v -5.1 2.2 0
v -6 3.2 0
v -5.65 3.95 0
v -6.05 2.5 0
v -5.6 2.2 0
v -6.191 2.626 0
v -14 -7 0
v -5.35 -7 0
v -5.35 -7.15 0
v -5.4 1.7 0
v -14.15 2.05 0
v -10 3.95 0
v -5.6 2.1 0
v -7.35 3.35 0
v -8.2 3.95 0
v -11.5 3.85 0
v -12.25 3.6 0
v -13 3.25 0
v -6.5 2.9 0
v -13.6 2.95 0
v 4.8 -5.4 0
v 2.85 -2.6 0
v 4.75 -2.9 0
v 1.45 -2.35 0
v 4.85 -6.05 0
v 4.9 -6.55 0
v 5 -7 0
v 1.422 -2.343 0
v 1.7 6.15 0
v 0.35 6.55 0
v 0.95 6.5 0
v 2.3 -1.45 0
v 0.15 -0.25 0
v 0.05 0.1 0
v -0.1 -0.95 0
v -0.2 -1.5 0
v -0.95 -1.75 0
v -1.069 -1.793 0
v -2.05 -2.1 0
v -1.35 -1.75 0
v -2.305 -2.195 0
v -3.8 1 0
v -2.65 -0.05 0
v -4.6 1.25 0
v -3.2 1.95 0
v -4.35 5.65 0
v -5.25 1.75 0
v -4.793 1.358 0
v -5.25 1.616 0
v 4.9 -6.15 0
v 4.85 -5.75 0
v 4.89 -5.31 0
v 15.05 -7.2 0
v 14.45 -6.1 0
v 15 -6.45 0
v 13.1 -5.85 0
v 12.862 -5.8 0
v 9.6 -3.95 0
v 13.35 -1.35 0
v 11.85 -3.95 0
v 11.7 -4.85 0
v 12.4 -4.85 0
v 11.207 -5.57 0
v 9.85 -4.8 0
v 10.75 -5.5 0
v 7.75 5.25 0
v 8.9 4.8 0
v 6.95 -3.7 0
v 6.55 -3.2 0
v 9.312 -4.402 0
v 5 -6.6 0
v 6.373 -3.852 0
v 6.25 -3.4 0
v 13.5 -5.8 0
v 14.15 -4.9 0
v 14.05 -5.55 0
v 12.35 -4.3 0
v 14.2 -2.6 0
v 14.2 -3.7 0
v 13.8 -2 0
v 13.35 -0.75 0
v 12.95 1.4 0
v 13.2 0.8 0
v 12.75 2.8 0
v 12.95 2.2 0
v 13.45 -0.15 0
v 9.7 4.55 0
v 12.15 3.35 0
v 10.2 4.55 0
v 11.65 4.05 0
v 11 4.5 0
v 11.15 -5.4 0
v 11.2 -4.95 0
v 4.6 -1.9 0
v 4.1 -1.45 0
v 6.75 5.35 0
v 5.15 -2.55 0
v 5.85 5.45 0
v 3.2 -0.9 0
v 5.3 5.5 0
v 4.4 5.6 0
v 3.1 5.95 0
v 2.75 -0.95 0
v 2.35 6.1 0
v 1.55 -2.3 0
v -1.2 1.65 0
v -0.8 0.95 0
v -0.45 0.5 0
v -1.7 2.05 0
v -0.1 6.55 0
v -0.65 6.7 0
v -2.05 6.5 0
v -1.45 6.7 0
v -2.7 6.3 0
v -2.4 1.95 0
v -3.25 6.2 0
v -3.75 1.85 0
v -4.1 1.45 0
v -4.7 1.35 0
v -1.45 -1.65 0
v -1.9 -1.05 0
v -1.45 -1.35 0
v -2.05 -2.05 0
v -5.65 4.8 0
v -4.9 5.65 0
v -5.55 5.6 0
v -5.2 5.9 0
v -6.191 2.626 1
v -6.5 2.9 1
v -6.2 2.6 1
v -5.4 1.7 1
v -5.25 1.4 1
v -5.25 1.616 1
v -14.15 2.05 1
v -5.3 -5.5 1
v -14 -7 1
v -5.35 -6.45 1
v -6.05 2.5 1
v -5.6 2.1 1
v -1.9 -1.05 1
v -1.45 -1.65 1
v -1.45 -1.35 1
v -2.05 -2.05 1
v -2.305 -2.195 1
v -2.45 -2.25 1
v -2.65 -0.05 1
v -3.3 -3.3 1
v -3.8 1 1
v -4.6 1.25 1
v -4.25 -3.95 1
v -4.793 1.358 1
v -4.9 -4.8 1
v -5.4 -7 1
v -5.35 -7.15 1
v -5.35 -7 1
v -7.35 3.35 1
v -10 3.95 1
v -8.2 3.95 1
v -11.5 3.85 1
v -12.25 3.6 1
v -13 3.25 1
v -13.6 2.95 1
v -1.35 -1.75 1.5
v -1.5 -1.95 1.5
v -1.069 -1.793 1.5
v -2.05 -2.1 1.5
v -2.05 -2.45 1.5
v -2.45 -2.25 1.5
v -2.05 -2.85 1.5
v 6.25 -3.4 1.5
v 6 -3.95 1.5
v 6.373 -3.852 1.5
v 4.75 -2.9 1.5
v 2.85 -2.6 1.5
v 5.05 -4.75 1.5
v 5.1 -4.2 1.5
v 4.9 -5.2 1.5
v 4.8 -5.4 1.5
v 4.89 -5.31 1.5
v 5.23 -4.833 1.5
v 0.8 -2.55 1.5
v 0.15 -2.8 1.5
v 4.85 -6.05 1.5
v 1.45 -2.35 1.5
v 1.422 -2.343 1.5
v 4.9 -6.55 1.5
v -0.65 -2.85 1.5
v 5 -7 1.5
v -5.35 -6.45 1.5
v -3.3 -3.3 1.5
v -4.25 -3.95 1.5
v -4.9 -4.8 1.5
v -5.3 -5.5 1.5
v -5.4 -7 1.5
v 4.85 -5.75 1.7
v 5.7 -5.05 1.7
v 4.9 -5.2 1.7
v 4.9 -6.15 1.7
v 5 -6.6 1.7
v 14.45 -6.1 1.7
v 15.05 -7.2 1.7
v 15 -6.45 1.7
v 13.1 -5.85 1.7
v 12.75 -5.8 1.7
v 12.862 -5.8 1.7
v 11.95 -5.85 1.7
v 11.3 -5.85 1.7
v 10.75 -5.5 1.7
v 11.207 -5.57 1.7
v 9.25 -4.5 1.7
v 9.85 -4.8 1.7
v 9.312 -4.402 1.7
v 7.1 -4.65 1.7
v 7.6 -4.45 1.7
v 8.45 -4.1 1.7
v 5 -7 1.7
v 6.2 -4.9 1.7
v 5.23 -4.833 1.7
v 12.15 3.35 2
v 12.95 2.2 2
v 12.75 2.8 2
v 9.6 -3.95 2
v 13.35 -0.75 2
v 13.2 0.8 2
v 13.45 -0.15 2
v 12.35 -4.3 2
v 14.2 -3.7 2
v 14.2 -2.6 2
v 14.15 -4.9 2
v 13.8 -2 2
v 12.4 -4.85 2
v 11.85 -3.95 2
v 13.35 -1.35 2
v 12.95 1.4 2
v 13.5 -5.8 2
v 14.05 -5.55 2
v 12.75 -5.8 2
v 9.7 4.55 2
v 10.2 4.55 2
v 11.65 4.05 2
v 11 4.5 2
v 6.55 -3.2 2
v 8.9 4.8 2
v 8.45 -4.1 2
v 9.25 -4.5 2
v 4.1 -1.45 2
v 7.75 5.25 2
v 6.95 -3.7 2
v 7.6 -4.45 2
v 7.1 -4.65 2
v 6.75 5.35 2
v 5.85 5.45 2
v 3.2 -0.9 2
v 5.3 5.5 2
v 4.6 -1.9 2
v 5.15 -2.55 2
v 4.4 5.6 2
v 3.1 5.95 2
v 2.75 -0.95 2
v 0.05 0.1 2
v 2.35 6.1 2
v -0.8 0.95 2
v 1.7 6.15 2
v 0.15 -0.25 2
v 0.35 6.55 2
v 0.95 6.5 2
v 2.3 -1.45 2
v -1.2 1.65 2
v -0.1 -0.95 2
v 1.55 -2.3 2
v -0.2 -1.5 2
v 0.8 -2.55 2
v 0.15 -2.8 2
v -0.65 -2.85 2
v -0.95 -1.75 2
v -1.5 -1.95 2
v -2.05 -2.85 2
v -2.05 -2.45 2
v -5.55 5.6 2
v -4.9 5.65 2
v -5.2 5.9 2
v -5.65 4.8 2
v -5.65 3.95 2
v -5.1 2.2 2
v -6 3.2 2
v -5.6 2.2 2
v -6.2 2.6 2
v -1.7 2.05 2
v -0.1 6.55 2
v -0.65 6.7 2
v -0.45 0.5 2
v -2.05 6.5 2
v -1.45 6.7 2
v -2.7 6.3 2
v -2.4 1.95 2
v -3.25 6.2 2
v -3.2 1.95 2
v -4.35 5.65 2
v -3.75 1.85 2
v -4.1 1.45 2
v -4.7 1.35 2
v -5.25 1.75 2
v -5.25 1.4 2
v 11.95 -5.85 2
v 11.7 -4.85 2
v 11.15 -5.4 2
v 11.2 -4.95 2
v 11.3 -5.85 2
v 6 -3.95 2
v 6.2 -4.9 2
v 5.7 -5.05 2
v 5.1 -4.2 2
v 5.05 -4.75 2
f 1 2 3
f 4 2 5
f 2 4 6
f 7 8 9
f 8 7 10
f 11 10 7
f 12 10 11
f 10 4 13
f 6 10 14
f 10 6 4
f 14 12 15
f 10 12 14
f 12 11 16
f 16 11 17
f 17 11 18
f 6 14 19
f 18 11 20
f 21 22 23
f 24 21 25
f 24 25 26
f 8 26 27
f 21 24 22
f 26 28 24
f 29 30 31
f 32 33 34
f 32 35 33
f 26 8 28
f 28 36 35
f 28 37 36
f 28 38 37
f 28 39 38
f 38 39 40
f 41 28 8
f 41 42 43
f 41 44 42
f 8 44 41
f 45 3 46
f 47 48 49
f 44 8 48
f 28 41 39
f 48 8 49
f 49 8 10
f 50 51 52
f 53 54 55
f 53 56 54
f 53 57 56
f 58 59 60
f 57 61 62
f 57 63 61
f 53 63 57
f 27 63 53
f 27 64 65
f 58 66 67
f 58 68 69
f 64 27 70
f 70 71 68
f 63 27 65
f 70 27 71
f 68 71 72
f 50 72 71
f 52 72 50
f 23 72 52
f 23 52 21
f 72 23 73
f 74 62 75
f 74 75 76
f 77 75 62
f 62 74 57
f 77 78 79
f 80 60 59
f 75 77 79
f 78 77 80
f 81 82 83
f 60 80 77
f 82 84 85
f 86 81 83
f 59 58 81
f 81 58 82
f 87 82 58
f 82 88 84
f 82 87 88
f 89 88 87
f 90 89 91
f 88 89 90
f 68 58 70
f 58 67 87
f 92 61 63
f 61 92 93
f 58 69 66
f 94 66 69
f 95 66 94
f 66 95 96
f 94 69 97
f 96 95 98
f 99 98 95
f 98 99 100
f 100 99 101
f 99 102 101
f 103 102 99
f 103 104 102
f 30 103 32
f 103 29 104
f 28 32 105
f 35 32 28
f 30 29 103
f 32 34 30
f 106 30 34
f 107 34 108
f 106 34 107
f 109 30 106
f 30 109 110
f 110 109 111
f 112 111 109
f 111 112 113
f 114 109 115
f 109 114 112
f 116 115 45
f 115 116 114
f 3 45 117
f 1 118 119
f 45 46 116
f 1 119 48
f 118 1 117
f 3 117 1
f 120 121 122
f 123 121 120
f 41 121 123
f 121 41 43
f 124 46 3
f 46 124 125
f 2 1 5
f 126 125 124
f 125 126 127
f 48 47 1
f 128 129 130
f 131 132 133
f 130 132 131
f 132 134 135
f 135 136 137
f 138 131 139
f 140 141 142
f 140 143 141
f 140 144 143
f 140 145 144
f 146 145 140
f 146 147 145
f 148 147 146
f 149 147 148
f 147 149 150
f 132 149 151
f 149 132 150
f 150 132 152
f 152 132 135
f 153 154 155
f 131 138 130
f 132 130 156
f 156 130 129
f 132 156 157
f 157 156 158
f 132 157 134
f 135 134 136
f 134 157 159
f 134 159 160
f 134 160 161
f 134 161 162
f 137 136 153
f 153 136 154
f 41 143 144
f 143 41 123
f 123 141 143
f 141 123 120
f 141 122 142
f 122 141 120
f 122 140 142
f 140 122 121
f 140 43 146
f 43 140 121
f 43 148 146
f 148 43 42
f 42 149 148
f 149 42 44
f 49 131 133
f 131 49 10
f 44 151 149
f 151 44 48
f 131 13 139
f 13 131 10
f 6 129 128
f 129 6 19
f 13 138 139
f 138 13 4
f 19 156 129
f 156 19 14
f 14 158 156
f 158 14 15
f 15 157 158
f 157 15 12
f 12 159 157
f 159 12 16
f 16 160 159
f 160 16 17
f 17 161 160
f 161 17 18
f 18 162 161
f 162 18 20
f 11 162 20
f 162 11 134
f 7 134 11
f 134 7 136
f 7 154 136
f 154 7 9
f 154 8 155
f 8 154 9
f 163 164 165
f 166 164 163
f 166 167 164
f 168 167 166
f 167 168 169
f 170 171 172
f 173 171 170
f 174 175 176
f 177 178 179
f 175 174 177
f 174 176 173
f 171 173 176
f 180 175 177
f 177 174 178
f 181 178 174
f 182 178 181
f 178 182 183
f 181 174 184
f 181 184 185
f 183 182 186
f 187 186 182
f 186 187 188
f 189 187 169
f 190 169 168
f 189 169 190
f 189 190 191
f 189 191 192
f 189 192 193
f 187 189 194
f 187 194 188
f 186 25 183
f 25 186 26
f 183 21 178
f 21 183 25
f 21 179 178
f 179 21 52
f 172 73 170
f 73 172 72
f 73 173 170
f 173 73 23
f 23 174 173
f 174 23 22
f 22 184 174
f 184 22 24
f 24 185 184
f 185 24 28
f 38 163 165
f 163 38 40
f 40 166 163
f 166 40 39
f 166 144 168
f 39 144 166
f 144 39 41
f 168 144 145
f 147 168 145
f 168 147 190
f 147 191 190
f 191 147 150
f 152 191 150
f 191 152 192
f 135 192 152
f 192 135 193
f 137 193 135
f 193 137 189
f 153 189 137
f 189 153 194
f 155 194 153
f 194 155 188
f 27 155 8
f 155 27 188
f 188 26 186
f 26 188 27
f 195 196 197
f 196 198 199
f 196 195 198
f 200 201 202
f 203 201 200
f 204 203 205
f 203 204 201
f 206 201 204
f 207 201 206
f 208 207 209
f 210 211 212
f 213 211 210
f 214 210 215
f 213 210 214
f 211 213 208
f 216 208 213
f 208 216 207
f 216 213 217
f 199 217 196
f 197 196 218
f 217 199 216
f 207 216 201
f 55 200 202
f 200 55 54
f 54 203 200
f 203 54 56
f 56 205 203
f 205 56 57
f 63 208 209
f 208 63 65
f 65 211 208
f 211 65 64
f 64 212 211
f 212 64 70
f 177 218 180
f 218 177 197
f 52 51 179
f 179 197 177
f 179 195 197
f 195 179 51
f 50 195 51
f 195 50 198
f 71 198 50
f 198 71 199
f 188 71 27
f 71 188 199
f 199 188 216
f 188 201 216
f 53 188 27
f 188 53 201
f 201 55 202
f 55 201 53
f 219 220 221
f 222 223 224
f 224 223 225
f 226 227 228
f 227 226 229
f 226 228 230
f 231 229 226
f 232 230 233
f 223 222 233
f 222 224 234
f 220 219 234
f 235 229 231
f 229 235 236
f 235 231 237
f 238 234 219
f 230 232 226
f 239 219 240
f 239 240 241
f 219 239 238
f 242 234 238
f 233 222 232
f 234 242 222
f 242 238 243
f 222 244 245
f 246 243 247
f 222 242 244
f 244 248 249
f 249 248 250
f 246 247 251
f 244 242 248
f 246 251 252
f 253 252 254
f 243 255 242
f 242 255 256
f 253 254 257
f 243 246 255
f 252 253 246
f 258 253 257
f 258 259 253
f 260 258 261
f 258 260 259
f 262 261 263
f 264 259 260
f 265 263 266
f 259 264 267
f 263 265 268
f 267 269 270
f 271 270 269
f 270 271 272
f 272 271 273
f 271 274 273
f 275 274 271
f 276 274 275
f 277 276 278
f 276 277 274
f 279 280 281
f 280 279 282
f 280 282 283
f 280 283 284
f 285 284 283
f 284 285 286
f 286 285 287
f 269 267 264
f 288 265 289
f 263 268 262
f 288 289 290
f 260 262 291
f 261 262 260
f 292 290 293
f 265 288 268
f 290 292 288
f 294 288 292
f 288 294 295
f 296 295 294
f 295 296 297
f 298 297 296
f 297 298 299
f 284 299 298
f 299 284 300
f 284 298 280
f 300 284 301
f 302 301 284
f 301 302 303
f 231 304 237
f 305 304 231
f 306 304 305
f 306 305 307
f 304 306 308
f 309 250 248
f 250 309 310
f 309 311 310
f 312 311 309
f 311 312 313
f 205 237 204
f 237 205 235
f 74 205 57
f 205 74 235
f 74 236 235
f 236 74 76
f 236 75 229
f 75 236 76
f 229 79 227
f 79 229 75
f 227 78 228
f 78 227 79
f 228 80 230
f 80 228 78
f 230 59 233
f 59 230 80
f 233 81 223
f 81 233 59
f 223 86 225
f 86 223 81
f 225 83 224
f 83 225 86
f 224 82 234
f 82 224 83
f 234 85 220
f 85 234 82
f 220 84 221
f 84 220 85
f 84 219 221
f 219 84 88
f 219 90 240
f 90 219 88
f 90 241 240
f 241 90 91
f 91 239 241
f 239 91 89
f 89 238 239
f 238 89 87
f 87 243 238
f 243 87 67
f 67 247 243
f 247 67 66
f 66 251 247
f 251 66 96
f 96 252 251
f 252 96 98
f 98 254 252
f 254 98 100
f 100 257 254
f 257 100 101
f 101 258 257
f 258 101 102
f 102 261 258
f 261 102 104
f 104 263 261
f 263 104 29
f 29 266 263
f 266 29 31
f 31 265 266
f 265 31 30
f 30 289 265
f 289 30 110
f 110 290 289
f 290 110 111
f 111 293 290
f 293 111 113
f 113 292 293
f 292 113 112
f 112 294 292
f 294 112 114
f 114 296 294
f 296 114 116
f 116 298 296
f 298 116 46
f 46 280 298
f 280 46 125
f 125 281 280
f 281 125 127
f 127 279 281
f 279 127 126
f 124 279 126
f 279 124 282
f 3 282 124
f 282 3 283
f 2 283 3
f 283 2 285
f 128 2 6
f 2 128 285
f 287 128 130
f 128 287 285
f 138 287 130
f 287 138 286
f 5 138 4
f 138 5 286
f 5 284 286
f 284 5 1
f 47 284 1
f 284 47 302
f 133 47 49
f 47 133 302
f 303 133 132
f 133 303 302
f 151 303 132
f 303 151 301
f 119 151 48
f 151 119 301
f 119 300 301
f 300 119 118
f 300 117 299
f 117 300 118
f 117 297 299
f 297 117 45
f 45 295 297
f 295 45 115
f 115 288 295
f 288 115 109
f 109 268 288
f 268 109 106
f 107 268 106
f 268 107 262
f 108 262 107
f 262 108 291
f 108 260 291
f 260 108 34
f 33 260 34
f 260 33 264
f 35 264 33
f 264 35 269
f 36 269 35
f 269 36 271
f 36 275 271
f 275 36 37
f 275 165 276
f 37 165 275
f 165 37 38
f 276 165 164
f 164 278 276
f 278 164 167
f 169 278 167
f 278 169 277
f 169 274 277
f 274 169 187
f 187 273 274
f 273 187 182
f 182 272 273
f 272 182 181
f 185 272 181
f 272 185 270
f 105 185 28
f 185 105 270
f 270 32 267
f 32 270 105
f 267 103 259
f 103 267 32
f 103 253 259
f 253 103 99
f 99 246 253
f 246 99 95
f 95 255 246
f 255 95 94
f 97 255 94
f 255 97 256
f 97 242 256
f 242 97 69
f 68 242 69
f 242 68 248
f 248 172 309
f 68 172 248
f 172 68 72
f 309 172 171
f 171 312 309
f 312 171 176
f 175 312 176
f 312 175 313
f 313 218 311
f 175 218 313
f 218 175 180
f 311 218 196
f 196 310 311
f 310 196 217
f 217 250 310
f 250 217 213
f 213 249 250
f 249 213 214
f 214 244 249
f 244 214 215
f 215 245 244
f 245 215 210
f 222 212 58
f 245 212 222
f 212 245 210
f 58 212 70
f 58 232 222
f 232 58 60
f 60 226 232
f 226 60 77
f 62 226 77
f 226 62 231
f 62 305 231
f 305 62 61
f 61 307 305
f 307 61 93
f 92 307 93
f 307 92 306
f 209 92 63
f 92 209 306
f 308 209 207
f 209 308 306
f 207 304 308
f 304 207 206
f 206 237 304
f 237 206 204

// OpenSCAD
//start
module  module1() 
{ 
color  ([0.4,0.6,0.4]) 
{ 
            polygon(points = [
[-14.15,2.05]
,[-13.60,2.95]
,[-13.00,3.25]
,[-12.25,3.60]
,[-11.50,3.85]
,[-10.75,3.90]
,[-10.00,3.95]
,[-9.10,3.95]
,[-8.20,3.95]
,[-7.35,3.35]
,[-6.50,2.90]
,[-6.05,2.50]
,[-5.60,2.10]
,[-5.40,1.70]
,[-4.60,1.25]
,[-3.80,1.00]
,[-2.65,-0.05]
,[-1.90,-1.05]
,[-1.45,-1.35]
,[-1.45,-1.65]
,[-2.05,-2.05]
,[-2.40,-2.25]
,[-3.30,-3.40]
,[-4.25,-4.05]
,[-4.85,-4.85]
,[-5.20,-5.50]
,[-5.35,-6.45]
,[-5.35,-7.15]
,[-14.00,-7.00]
]
,paths = [
[0,1,2,3,4,5,6,7,8,9,10,11,12,13,14,15,16,17,18,19,20,21,22,23,24,25,26,27,28]]
            );
}
}
//start
module  module2() 
{ 
color  ([0.6,1,0.8]) 
{ 
            polygon(points = [
[-1.35,-1.75]
,[-2.05,-2.10]
,[-2.45,-2.25]
,[-3.30,-3.30]
,[-4.25,-3.95]
,[-4.90,-4.80]
,[-5.30,-5.50]
,[-5.35,-6.45]
,[-5.40,-7.00]
,[5.00,-7.00]
,[4.90,-6.55]
,[4.85,-6.05]
,[4.80,-5.40]
,[5.25,-4.95]
,[5.85,-4.40]
,[6.40,-3.95]
,[6.25,-3.40]
,[4.75,-2.90]
,[2.85,-2.60]
,[1.45,-2.35]
,[-0.05,-1.95]
]
,paths = [
[0,1,2,3,4,5,6,7,8,9,10,11,12,13,14,15,16,17,18,19,20]]
            );
}
}
//start
module  module3() 
{ 
color  ([0.6,0.6,0.2]) 
{ 
            polygon(points = [
[6.70,-3.85]
,[7.35,-3.85]
,[8.15,-3.95]
,[8.70,-3.95]
,[9.85,-4.80]
,[10.75,-5.50]
,[11.40,-5.60]
,[12.15,-5.65]
,[13.10,-5.85]
,[14.45,-6.10]
,[15.00,-6.45]
,[15.05,-7.20]
,[5.00,-7.00]
,[5.00,-6.60]
,[4.90,-6.15]
,[4.85,-5.75]
,[4.90,-5.20]
,[5.35,-4.70]
,[6.00,-4.20]
,[6.75,-3.95]
]
,paths = [
[0,1,2,3,4,5,6,7,8,9,10,11,12,13,14,15,16,17,18],[19]]
            );
}
}
//start
module  module4() 
{ 
color  ([1,0.8549019607843137,0.5411764705882353]) 
{ 
            polygon(points = [
[6.20,-4.90]
,[5.70,-5.05]
,[5.05,-4.75]
,[5.10,-4.20]
,[6.00,-3.95]
,[6.95,-3.70]
,[6.55,-3.20]
,[5.15,-2.55]
,[4.60,-1.90]
,[4.10,-1.45]
,[3.20,-0.90]
,[2.75,-0.95]
,[2.30,-1.45]
,[1.55,-2.30]
,[0.80,-2.55]
,[0.15,-2.80]
,[-0.65,-2.85]
,[-1.65,-2.85]
,[-2.05,-2.85]
,[-2.05,-2.45]
,[-1.50,-1.95]
,[-0.95,-1.75]
,[-0.20,-1.50]
,[-0.10,-0.95]
,[0.15,-0.25]
,[0.05,0.10]
,[-0.45,0.50]
,[-0.80,0.95]
,[-1.20,1.65]
,[-1.70,2.05]
,[-2.40,1.95]
,[-3.20,1.95]
,[-3.75,1.85]
,[-4.10,1.45]
,[-4.70,1.35]
,[-5.25,1.40]
,[-5.25,1.75]
,[-5.10,2.20]
,[-5.60,2.20]
,[-6.20,2.60]
,[-6.00,3.20]
,[-5.65,3.95]
,[-5.65,4.80]
,[-5.55,5.60]
,[-5.20,5.90]
,[-4.90,5.65]
,[-4.35,5.65]
,[-3.65,6.00]
,[-3.25,6.20]
,[-2.70,6.30]
,[-2.05,6.50]
,[-1.45,6.70]
,[-0.65,6.70]
,[-0.10,6.55]
,[0.35,6.55]
,[0.95,6.50]
,[1.70,6.15]
,[2.35,6.10]
,[3.10,5.95]
,[4.40,5.60]
,[5.30,5.50]
,[5.85,5.45]
,[6.75,5.35]
,[7.75,5.25]
,[8.90,4.80]
,[9.70,4.55]
,[10.20,4.55]
,[11.00,4.50]
,[11.65,4.05]
,[12.15,3.35]
,[12.75,2.80]
,[12.95,2.20]
,[12.95,1.40]
,[13.20,0.80]
,[13.45,-0.15]
,[13.35,-0.75]
,[13.35,-1.35]
,[13.80,-2.00]
,[14.20,-2.60]
,[14.20,-3.70]
,[14.15,-4.90]
,[14.05,-5.55]
,[13.50,-5.80]
,[12.75,-5.80]
,[11.95,-5.85]
,[11.30,-5.85]
,[11.15,-5.40]
,[11.20,-4.95]
,[11.70,-4.85]
,[12.40,-4.85]
,[12.35,-4.30]
,[11.85,-3.95]
,[11.05,-3.95]
,[10.30,-3.95]
,[9.60,-3.95]
,[9.25,-4.50]
,[8.45,-4.10]
,[7.60,-4.45]
,[7.10,-4.65]
]
,paths = [
[0,1,2,3,4,5,6,7,8,9,10,11,12,13,14,15,16,17,18,19,20,21,22,23,24,25,26,27,28,29,30,31,32,33,34,35,36,37,38,39,40,41,42,43,44,45,46,47,48,49,50,51,52,53,54,55,56,57,58,59,60,61,62,63,64,65,66,67,68,69,70,71,72,73,74,75,76,77,78,79,80,81,82,83,84,85,86,87,88,89,90,91,92,93,94,95,96,97,98]]
            );
}
}
color("brown")
linear_extrude(height=1)
module1();

color("red")
linear_extrude(height=1.5)
module2();

color("brown")
linear_extrude(height=1.7)
module3();

color("yellow")
linear_extrude(height=2)
module4();
